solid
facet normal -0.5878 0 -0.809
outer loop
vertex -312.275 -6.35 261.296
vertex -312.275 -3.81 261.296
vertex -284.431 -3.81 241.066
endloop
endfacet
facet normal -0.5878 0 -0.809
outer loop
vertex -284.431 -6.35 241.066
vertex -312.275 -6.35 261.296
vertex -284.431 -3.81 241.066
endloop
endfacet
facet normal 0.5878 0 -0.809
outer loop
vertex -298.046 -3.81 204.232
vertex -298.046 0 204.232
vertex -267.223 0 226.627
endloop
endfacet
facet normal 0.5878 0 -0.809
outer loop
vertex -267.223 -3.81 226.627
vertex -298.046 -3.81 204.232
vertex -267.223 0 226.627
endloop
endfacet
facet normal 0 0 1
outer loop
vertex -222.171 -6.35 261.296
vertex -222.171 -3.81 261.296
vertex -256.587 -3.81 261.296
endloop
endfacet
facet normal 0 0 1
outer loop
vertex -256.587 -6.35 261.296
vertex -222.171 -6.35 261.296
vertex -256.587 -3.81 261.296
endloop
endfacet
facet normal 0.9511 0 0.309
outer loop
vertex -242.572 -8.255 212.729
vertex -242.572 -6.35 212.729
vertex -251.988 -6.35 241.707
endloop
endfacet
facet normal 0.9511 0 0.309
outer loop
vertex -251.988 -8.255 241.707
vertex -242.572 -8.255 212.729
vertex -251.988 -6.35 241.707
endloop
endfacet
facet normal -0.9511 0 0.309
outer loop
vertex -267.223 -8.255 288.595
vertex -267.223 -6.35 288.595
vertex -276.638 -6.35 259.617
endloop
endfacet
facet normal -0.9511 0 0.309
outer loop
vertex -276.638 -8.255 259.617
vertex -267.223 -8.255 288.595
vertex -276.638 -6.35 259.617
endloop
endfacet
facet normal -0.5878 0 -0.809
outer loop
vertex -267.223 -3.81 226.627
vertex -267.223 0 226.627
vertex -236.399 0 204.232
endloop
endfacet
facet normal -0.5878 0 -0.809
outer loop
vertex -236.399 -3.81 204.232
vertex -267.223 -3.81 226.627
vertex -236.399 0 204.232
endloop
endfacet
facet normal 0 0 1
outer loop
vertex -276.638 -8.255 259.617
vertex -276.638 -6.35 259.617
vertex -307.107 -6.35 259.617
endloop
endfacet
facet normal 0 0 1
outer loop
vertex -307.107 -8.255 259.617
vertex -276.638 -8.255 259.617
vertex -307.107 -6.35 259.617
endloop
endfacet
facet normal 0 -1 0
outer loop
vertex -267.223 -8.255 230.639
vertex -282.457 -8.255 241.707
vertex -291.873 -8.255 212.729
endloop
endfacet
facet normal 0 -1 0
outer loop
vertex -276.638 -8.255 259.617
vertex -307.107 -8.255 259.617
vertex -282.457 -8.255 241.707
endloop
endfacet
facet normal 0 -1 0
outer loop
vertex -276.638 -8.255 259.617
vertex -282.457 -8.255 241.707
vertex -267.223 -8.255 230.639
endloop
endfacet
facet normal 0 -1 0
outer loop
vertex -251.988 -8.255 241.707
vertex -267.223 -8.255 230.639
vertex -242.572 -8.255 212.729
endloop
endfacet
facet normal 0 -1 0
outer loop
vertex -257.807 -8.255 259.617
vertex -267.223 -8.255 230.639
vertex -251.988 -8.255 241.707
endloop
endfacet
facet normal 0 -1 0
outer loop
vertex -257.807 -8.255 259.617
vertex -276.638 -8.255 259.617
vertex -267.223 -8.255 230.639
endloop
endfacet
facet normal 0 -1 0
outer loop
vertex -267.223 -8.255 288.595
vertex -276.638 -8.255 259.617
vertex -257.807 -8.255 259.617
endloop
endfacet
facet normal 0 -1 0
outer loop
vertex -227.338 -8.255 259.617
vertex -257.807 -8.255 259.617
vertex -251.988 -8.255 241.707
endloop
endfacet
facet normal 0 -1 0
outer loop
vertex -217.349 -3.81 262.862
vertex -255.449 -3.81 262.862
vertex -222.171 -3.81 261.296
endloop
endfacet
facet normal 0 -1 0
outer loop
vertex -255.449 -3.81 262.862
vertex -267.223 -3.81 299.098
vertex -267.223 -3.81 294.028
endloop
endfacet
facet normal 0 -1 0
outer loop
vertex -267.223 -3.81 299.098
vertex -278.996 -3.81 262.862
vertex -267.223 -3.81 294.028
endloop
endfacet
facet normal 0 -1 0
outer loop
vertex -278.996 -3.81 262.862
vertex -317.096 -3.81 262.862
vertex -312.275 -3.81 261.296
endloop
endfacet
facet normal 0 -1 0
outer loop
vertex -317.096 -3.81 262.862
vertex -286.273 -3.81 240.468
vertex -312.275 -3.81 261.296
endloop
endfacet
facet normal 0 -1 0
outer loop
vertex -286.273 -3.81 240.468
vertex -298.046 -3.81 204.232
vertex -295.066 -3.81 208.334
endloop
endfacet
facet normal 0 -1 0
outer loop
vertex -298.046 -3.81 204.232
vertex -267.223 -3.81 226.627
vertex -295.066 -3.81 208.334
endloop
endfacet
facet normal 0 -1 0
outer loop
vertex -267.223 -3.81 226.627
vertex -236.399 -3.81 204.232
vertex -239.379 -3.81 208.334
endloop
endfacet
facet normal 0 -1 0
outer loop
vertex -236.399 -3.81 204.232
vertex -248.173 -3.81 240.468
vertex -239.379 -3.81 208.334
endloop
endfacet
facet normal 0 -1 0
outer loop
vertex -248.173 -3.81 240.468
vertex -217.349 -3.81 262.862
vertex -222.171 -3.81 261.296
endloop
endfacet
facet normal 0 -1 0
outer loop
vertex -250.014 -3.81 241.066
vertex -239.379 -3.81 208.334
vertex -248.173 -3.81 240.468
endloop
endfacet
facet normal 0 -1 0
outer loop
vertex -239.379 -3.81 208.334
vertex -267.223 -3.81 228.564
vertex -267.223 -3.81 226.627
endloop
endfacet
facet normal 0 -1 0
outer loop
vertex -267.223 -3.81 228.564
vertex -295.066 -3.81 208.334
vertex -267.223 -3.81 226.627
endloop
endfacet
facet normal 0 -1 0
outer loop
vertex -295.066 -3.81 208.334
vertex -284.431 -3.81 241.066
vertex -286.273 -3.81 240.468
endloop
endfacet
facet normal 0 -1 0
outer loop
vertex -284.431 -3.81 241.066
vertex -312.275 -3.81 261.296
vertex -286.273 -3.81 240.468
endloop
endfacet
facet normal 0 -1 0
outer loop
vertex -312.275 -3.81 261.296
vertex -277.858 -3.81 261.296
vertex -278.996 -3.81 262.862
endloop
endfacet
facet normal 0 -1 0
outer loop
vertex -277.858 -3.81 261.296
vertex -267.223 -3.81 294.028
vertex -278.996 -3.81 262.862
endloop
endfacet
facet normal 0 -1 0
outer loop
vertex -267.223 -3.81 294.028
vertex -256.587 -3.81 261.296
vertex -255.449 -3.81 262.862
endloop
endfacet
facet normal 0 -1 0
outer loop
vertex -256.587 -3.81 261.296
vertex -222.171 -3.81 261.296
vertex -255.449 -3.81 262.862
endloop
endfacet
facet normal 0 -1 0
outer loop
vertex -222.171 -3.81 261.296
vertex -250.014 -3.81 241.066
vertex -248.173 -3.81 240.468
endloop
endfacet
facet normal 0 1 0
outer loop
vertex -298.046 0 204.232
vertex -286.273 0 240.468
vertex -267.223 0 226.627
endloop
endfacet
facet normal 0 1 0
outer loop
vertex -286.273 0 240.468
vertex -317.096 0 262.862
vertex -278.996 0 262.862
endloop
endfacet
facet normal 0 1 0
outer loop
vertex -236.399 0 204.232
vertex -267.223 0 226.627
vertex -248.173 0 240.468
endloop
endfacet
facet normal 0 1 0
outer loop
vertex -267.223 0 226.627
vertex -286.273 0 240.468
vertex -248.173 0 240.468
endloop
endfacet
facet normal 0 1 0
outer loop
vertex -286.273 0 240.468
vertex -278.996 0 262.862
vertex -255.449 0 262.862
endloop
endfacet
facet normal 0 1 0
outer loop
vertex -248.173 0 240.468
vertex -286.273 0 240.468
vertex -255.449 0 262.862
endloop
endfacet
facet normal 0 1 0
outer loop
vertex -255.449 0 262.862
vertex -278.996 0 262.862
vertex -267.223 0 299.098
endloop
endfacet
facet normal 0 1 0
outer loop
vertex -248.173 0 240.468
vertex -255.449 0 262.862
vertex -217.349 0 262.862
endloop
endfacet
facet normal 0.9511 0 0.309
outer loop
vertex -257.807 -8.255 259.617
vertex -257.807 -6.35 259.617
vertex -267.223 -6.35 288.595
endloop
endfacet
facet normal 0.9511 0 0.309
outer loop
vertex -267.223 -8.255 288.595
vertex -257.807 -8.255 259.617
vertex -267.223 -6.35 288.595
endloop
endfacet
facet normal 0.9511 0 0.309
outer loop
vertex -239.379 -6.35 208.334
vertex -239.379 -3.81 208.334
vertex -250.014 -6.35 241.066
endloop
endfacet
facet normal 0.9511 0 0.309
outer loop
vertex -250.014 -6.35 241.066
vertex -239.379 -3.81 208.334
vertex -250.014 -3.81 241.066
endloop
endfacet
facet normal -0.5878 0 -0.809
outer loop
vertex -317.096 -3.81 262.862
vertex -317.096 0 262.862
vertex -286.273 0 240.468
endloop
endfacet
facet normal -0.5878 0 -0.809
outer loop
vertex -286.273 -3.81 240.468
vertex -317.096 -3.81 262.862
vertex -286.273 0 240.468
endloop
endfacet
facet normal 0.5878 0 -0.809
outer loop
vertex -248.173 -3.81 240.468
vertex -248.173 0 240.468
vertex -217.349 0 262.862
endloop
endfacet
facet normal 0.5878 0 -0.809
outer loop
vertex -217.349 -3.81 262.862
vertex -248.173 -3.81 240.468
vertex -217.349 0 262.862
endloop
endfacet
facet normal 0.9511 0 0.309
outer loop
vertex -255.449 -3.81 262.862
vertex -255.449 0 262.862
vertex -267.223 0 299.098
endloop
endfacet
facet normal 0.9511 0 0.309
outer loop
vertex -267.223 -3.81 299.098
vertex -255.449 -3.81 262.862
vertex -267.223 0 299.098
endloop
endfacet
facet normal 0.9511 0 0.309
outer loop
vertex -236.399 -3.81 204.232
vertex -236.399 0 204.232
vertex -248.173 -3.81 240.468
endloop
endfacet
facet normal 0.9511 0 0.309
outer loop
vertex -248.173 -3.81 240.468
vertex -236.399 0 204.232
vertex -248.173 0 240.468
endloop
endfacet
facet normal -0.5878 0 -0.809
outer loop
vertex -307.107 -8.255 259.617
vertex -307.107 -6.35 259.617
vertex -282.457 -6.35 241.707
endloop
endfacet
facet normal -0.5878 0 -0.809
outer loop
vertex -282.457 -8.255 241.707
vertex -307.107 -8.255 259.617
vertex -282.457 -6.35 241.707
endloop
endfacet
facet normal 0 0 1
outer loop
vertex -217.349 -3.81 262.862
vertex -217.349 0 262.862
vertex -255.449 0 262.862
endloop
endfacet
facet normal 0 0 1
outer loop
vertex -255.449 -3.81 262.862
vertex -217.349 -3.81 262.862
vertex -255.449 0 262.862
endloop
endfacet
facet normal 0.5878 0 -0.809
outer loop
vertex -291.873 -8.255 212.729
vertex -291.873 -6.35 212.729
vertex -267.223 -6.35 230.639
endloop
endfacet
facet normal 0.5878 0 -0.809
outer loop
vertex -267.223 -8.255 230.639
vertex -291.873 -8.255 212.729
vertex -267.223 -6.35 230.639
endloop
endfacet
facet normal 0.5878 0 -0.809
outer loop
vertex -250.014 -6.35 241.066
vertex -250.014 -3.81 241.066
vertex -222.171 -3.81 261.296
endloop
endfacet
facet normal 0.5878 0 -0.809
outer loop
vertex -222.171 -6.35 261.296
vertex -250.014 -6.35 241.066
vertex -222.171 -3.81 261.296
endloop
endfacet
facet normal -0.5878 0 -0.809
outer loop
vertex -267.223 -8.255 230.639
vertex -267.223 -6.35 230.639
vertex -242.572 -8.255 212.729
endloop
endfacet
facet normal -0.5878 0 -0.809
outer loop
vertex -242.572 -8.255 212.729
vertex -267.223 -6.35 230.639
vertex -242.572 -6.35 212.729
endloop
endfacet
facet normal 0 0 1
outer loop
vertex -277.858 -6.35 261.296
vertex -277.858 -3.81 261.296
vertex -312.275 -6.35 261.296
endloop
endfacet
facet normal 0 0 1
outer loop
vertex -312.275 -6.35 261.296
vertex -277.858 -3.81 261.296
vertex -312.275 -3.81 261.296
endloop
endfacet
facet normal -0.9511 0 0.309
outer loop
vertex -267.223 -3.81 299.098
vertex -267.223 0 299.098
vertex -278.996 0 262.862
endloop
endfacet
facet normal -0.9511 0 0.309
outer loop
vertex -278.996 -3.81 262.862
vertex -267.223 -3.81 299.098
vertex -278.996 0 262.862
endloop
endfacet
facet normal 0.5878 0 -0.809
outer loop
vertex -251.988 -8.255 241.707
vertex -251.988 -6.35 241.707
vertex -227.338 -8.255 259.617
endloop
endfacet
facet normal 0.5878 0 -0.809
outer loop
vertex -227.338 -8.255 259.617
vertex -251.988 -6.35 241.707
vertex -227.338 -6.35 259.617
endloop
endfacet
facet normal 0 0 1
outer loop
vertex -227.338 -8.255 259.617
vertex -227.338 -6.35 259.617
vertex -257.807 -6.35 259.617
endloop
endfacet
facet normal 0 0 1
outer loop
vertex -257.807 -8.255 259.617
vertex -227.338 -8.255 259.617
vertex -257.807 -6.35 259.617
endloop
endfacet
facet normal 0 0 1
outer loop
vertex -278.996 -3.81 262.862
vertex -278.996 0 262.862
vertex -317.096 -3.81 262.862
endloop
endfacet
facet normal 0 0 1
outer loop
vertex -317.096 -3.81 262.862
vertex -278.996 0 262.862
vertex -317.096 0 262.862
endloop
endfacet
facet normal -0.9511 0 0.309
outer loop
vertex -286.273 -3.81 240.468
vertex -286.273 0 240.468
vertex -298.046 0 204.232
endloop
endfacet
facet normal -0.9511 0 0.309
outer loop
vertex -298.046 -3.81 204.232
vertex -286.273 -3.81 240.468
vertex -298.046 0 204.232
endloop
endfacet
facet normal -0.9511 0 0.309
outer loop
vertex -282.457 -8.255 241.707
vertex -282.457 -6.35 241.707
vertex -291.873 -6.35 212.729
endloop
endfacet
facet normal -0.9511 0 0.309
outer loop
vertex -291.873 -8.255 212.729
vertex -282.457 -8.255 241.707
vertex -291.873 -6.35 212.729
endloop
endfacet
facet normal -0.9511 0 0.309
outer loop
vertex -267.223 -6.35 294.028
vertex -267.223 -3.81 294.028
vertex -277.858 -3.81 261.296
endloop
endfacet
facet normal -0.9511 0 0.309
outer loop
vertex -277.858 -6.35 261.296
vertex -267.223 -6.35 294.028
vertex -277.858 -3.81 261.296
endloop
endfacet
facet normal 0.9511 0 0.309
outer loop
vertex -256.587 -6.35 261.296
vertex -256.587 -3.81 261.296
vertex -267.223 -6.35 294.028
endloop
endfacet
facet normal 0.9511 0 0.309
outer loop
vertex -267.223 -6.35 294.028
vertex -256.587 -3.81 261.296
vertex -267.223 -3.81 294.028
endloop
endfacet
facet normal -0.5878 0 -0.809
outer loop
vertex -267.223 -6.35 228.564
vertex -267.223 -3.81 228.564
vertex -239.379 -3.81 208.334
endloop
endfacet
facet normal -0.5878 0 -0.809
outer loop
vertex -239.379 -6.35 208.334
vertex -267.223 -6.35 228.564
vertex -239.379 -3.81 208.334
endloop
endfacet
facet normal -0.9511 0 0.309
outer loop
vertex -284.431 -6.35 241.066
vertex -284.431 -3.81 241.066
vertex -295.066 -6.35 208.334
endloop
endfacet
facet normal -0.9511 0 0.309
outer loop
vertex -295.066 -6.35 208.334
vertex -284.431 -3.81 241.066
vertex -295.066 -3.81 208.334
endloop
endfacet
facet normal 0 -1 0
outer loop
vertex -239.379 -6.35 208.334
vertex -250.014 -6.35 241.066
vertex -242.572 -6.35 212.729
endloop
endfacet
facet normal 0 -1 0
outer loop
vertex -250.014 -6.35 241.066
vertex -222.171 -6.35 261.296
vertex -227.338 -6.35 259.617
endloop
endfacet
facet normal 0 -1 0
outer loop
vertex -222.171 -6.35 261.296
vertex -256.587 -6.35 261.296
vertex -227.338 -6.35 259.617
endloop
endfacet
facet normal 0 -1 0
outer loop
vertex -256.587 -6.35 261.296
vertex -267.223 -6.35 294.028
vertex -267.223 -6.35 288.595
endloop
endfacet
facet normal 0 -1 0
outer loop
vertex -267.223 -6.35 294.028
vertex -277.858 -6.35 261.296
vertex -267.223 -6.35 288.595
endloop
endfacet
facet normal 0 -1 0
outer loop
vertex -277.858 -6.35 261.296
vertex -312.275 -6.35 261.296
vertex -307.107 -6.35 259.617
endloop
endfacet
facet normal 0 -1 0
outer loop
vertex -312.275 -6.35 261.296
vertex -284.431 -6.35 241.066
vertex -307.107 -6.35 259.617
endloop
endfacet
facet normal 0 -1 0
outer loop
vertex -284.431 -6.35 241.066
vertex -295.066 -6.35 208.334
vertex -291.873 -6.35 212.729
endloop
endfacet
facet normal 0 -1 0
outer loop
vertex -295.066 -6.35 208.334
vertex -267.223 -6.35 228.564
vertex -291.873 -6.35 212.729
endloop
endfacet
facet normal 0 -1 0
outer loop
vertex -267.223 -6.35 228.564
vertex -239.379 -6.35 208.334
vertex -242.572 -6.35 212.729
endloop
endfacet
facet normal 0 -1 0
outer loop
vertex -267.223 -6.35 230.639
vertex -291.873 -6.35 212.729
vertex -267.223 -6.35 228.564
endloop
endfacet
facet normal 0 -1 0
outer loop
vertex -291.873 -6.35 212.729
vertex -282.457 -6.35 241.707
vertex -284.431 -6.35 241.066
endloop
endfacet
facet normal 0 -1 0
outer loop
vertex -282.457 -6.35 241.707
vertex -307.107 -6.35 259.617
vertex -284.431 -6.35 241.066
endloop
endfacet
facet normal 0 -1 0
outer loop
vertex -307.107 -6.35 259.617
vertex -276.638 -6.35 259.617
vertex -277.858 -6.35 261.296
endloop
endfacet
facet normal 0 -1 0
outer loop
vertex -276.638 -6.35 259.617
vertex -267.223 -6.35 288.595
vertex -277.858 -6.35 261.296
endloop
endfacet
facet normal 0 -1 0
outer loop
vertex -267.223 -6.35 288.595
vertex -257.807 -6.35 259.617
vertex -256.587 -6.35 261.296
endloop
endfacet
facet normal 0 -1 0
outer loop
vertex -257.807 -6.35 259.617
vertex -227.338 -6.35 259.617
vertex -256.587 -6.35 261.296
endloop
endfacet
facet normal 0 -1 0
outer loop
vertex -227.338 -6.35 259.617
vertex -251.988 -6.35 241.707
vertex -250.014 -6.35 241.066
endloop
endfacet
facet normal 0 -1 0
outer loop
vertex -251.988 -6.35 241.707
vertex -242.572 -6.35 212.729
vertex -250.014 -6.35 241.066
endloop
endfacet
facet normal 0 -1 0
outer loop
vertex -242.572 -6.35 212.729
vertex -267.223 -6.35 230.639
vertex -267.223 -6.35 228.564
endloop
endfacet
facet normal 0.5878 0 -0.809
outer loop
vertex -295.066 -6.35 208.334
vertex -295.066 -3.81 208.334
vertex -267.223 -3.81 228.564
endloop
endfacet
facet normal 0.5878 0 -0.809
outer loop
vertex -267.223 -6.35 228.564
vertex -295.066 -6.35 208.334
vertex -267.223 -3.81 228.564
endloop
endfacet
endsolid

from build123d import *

# Parameters (mm, degrees)
F1_DEPTH = 3.81
F3_DEPTH = 2.54
F5_DEPTH = 1.905


with BuildPart() as f1:
    # F0 (on Front) → F1 (new body)
    with BuildSketch(Plane.XZ):
        Polygon((-217.349024, 262.862362), (-255.449024, 262.862362), (-267.222571, 299.097615), (-278.996119, 262.862362), (-317.096119, 262.862362), (-286.272571, 240.467744), (-298.046119, 204.23249), (-267.222571, 226.627108), (-236.399024, 204.23249), (-248.172571, 240.467744), align=None)
    extrude(amount=F1_DEPTH)

    # F2 (on face) → F3 (join)
    with BuildSketch(Plane.XZ.offset(3.81)):
        Polygon((-239.378866, 208.333892), (-250.014215, 241.06613), (-222.17051, 261.295766), (-256.587222, 261.295766), (-267.222571, 294.028004), (-277.85792, 261.295766), (-312.274632, 261.295766), (-284.430927, 241.06613), (-295.066276, 208.333892), (-267.222571, 228.563528), align=None)
    extrude(amount=F3_DEPTH)

    # F4 (on face) → F5 (join)
    with BuildSketch(Plane.XZ.offset(6.35)):
        Polygon((-291.872742, 212.729414), (-267.222571, 230.638812), (-242.5724, 212.729414), (-251.987928, 241.707428), (-227.337756, 259.616826), (-257.807044, 259.616826), (-267.222571, 288.59484), (-276.638099, 259.616826), (-307.107386, 259.616826), (-282.457215, 241.707428), align=None)
    extrude(amount=F5_DEPTH)


solid = f1.part
